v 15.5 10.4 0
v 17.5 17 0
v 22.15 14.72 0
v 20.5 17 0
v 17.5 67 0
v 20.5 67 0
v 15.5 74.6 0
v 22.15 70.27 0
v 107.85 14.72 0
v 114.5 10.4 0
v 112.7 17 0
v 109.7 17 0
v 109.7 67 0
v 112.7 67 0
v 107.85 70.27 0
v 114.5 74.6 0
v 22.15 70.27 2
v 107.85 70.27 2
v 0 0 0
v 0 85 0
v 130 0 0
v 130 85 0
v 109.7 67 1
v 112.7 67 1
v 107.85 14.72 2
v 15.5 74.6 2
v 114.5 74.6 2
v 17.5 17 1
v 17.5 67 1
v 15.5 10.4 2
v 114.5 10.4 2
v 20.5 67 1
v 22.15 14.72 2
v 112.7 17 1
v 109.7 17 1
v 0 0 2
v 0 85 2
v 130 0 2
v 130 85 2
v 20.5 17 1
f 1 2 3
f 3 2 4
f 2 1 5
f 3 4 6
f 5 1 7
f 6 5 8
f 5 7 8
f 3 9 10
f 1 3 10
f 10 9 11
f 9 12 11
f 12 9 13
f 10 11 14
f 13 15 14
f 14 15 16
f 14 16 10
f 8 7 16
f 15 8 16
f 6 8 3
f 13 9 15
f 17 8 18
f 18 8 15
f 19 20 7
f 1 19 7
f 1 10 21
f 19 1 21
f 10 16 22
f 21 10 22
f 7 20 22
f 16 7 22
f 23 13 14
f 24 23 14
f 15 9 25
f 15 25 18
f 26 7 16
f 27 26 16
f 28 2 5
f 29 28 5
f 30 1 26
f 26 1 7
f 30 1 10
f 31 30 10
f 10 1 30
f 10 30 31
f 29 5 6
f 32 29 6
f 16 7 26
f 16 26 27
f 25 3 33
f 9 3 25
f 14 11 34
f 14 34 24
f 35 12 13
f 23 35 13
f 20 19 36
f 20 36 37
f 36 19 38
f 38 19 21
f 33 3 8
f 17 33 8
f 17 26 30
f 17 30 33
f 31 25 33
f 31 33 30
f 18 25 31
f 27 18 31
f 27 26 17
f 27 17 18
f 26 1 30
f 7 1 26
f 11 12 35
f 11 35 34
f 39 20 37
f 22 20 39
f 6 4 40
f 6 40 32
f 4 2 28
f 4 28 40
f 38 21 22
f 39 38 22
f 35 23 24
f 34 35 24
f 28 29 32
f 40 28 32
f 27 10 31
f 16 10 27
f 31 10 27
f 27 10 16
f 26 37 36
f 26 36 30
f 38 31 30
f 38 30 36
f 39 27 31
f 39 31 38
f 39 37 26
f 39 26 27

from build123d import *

# Parameters (mm, degrees)
BOX001_W     = 99
BOX001_H     = 64.2
BOX001_DEPTH = 2
BOX_W        = 130
BOX_H        = 85
BOX_DEPTH    = 2
BOX005_W     = 3
BOX005_H     = 50
BOX005_DEPTH = 1
BOX004_W     = 3
BOX004_H     = 50
BOX004_DEPTH = 1
BOX002_W     = 85.7
BOX002_H     = 55.55
BOX002_DEPTH = 2
BOX003_W     = 99
BOX003_H     = 64.2
BOX003_DEPTH = 2


with BuildPart() as cube001:
    # Box001 → Box001 (new body)
    with BuildSketch(Plane(origin=(15.5, 10.4, 0), x_dir=(1, 0, 0), z_dir=(0, 0, 1))):
        with Locations((49.5, 32.1)):
            Rectangle(BOX001_W, BOX001_H)
    extrude(amount=BOX001_DEPTH)


with BuildPart() as cut:
    # Box → Box (new body)
    with BuildSketch(Plane.XY):
        with Locations((65, 42.5)):
            Rectangle(BOX_W, BOX_H)
    extrude(amount=BOX_DEPTH)

    # Cut: cut Cube001
    add(cube001.part, mode=Mode.SUBTRACT)


with BuildPart() as cube005:
    # Box005 → Box005 (new body)
    with BuildSketch(Plane(origin=(109.7, 17, 0), x_dir=(1, 0, 0), z_dir=(0, 0, 1))):
        with Locations((1.5, 25)):
            Rectangle(BOX005_W, BOX005_H)
    extrude(amount=BOX005_DEPTH)


with BuildPart() as cube004:
    # Box004 → Box004 (new body)
    with BuildSketch(Plane(origin=(17.5, 17, 0), x_dir=(1, 0, 0), z_dir=(0, 0, 1))):
        with Locations((1.5, 25)):
            Rectangle(BOX004_W, BOX004_H)
    extrude(amount=BOX004_DEPTH)


with BuildPart() as cube002:
    # Box002 → Box002 (new body)
    with BuildSketch(Plane(origin=(22.15, 14.72, 0), x_dir=(1, 0, 0), z_dir=(0, 0, 1))):
        with Locations((42.85, 27.775)):
            Rectangle(BOX002_W, BOX002_H)
    extrude(amount=BOX002_DEPTH)


with BuildPart() as cut003:
    # Box003 → Box003 (new body)
    with BuildSketch(Plane(origin=(15.5, 10.4, 0), x_dir=(1, 0, 0), z_dir=(0, 0, 1))):
        with Locations((49.5, 32.1)):
            Rectangle(BOX003_W, BOX003_H)
    extrude(amount=BOX003_DEPTH)

    # Cut001: cut Cube002
    add(cube002.part, mode=Mode.SUBTRACT)

    # Cut002: cut Cube004
    add(cube004.part, mode=Mode.SUBTRACT)

    # Cut003: cut Cube005
    add(cube005.part, mode=Mode.SUBTRACT)


solid = Compound([cut.part, cut003.part])
